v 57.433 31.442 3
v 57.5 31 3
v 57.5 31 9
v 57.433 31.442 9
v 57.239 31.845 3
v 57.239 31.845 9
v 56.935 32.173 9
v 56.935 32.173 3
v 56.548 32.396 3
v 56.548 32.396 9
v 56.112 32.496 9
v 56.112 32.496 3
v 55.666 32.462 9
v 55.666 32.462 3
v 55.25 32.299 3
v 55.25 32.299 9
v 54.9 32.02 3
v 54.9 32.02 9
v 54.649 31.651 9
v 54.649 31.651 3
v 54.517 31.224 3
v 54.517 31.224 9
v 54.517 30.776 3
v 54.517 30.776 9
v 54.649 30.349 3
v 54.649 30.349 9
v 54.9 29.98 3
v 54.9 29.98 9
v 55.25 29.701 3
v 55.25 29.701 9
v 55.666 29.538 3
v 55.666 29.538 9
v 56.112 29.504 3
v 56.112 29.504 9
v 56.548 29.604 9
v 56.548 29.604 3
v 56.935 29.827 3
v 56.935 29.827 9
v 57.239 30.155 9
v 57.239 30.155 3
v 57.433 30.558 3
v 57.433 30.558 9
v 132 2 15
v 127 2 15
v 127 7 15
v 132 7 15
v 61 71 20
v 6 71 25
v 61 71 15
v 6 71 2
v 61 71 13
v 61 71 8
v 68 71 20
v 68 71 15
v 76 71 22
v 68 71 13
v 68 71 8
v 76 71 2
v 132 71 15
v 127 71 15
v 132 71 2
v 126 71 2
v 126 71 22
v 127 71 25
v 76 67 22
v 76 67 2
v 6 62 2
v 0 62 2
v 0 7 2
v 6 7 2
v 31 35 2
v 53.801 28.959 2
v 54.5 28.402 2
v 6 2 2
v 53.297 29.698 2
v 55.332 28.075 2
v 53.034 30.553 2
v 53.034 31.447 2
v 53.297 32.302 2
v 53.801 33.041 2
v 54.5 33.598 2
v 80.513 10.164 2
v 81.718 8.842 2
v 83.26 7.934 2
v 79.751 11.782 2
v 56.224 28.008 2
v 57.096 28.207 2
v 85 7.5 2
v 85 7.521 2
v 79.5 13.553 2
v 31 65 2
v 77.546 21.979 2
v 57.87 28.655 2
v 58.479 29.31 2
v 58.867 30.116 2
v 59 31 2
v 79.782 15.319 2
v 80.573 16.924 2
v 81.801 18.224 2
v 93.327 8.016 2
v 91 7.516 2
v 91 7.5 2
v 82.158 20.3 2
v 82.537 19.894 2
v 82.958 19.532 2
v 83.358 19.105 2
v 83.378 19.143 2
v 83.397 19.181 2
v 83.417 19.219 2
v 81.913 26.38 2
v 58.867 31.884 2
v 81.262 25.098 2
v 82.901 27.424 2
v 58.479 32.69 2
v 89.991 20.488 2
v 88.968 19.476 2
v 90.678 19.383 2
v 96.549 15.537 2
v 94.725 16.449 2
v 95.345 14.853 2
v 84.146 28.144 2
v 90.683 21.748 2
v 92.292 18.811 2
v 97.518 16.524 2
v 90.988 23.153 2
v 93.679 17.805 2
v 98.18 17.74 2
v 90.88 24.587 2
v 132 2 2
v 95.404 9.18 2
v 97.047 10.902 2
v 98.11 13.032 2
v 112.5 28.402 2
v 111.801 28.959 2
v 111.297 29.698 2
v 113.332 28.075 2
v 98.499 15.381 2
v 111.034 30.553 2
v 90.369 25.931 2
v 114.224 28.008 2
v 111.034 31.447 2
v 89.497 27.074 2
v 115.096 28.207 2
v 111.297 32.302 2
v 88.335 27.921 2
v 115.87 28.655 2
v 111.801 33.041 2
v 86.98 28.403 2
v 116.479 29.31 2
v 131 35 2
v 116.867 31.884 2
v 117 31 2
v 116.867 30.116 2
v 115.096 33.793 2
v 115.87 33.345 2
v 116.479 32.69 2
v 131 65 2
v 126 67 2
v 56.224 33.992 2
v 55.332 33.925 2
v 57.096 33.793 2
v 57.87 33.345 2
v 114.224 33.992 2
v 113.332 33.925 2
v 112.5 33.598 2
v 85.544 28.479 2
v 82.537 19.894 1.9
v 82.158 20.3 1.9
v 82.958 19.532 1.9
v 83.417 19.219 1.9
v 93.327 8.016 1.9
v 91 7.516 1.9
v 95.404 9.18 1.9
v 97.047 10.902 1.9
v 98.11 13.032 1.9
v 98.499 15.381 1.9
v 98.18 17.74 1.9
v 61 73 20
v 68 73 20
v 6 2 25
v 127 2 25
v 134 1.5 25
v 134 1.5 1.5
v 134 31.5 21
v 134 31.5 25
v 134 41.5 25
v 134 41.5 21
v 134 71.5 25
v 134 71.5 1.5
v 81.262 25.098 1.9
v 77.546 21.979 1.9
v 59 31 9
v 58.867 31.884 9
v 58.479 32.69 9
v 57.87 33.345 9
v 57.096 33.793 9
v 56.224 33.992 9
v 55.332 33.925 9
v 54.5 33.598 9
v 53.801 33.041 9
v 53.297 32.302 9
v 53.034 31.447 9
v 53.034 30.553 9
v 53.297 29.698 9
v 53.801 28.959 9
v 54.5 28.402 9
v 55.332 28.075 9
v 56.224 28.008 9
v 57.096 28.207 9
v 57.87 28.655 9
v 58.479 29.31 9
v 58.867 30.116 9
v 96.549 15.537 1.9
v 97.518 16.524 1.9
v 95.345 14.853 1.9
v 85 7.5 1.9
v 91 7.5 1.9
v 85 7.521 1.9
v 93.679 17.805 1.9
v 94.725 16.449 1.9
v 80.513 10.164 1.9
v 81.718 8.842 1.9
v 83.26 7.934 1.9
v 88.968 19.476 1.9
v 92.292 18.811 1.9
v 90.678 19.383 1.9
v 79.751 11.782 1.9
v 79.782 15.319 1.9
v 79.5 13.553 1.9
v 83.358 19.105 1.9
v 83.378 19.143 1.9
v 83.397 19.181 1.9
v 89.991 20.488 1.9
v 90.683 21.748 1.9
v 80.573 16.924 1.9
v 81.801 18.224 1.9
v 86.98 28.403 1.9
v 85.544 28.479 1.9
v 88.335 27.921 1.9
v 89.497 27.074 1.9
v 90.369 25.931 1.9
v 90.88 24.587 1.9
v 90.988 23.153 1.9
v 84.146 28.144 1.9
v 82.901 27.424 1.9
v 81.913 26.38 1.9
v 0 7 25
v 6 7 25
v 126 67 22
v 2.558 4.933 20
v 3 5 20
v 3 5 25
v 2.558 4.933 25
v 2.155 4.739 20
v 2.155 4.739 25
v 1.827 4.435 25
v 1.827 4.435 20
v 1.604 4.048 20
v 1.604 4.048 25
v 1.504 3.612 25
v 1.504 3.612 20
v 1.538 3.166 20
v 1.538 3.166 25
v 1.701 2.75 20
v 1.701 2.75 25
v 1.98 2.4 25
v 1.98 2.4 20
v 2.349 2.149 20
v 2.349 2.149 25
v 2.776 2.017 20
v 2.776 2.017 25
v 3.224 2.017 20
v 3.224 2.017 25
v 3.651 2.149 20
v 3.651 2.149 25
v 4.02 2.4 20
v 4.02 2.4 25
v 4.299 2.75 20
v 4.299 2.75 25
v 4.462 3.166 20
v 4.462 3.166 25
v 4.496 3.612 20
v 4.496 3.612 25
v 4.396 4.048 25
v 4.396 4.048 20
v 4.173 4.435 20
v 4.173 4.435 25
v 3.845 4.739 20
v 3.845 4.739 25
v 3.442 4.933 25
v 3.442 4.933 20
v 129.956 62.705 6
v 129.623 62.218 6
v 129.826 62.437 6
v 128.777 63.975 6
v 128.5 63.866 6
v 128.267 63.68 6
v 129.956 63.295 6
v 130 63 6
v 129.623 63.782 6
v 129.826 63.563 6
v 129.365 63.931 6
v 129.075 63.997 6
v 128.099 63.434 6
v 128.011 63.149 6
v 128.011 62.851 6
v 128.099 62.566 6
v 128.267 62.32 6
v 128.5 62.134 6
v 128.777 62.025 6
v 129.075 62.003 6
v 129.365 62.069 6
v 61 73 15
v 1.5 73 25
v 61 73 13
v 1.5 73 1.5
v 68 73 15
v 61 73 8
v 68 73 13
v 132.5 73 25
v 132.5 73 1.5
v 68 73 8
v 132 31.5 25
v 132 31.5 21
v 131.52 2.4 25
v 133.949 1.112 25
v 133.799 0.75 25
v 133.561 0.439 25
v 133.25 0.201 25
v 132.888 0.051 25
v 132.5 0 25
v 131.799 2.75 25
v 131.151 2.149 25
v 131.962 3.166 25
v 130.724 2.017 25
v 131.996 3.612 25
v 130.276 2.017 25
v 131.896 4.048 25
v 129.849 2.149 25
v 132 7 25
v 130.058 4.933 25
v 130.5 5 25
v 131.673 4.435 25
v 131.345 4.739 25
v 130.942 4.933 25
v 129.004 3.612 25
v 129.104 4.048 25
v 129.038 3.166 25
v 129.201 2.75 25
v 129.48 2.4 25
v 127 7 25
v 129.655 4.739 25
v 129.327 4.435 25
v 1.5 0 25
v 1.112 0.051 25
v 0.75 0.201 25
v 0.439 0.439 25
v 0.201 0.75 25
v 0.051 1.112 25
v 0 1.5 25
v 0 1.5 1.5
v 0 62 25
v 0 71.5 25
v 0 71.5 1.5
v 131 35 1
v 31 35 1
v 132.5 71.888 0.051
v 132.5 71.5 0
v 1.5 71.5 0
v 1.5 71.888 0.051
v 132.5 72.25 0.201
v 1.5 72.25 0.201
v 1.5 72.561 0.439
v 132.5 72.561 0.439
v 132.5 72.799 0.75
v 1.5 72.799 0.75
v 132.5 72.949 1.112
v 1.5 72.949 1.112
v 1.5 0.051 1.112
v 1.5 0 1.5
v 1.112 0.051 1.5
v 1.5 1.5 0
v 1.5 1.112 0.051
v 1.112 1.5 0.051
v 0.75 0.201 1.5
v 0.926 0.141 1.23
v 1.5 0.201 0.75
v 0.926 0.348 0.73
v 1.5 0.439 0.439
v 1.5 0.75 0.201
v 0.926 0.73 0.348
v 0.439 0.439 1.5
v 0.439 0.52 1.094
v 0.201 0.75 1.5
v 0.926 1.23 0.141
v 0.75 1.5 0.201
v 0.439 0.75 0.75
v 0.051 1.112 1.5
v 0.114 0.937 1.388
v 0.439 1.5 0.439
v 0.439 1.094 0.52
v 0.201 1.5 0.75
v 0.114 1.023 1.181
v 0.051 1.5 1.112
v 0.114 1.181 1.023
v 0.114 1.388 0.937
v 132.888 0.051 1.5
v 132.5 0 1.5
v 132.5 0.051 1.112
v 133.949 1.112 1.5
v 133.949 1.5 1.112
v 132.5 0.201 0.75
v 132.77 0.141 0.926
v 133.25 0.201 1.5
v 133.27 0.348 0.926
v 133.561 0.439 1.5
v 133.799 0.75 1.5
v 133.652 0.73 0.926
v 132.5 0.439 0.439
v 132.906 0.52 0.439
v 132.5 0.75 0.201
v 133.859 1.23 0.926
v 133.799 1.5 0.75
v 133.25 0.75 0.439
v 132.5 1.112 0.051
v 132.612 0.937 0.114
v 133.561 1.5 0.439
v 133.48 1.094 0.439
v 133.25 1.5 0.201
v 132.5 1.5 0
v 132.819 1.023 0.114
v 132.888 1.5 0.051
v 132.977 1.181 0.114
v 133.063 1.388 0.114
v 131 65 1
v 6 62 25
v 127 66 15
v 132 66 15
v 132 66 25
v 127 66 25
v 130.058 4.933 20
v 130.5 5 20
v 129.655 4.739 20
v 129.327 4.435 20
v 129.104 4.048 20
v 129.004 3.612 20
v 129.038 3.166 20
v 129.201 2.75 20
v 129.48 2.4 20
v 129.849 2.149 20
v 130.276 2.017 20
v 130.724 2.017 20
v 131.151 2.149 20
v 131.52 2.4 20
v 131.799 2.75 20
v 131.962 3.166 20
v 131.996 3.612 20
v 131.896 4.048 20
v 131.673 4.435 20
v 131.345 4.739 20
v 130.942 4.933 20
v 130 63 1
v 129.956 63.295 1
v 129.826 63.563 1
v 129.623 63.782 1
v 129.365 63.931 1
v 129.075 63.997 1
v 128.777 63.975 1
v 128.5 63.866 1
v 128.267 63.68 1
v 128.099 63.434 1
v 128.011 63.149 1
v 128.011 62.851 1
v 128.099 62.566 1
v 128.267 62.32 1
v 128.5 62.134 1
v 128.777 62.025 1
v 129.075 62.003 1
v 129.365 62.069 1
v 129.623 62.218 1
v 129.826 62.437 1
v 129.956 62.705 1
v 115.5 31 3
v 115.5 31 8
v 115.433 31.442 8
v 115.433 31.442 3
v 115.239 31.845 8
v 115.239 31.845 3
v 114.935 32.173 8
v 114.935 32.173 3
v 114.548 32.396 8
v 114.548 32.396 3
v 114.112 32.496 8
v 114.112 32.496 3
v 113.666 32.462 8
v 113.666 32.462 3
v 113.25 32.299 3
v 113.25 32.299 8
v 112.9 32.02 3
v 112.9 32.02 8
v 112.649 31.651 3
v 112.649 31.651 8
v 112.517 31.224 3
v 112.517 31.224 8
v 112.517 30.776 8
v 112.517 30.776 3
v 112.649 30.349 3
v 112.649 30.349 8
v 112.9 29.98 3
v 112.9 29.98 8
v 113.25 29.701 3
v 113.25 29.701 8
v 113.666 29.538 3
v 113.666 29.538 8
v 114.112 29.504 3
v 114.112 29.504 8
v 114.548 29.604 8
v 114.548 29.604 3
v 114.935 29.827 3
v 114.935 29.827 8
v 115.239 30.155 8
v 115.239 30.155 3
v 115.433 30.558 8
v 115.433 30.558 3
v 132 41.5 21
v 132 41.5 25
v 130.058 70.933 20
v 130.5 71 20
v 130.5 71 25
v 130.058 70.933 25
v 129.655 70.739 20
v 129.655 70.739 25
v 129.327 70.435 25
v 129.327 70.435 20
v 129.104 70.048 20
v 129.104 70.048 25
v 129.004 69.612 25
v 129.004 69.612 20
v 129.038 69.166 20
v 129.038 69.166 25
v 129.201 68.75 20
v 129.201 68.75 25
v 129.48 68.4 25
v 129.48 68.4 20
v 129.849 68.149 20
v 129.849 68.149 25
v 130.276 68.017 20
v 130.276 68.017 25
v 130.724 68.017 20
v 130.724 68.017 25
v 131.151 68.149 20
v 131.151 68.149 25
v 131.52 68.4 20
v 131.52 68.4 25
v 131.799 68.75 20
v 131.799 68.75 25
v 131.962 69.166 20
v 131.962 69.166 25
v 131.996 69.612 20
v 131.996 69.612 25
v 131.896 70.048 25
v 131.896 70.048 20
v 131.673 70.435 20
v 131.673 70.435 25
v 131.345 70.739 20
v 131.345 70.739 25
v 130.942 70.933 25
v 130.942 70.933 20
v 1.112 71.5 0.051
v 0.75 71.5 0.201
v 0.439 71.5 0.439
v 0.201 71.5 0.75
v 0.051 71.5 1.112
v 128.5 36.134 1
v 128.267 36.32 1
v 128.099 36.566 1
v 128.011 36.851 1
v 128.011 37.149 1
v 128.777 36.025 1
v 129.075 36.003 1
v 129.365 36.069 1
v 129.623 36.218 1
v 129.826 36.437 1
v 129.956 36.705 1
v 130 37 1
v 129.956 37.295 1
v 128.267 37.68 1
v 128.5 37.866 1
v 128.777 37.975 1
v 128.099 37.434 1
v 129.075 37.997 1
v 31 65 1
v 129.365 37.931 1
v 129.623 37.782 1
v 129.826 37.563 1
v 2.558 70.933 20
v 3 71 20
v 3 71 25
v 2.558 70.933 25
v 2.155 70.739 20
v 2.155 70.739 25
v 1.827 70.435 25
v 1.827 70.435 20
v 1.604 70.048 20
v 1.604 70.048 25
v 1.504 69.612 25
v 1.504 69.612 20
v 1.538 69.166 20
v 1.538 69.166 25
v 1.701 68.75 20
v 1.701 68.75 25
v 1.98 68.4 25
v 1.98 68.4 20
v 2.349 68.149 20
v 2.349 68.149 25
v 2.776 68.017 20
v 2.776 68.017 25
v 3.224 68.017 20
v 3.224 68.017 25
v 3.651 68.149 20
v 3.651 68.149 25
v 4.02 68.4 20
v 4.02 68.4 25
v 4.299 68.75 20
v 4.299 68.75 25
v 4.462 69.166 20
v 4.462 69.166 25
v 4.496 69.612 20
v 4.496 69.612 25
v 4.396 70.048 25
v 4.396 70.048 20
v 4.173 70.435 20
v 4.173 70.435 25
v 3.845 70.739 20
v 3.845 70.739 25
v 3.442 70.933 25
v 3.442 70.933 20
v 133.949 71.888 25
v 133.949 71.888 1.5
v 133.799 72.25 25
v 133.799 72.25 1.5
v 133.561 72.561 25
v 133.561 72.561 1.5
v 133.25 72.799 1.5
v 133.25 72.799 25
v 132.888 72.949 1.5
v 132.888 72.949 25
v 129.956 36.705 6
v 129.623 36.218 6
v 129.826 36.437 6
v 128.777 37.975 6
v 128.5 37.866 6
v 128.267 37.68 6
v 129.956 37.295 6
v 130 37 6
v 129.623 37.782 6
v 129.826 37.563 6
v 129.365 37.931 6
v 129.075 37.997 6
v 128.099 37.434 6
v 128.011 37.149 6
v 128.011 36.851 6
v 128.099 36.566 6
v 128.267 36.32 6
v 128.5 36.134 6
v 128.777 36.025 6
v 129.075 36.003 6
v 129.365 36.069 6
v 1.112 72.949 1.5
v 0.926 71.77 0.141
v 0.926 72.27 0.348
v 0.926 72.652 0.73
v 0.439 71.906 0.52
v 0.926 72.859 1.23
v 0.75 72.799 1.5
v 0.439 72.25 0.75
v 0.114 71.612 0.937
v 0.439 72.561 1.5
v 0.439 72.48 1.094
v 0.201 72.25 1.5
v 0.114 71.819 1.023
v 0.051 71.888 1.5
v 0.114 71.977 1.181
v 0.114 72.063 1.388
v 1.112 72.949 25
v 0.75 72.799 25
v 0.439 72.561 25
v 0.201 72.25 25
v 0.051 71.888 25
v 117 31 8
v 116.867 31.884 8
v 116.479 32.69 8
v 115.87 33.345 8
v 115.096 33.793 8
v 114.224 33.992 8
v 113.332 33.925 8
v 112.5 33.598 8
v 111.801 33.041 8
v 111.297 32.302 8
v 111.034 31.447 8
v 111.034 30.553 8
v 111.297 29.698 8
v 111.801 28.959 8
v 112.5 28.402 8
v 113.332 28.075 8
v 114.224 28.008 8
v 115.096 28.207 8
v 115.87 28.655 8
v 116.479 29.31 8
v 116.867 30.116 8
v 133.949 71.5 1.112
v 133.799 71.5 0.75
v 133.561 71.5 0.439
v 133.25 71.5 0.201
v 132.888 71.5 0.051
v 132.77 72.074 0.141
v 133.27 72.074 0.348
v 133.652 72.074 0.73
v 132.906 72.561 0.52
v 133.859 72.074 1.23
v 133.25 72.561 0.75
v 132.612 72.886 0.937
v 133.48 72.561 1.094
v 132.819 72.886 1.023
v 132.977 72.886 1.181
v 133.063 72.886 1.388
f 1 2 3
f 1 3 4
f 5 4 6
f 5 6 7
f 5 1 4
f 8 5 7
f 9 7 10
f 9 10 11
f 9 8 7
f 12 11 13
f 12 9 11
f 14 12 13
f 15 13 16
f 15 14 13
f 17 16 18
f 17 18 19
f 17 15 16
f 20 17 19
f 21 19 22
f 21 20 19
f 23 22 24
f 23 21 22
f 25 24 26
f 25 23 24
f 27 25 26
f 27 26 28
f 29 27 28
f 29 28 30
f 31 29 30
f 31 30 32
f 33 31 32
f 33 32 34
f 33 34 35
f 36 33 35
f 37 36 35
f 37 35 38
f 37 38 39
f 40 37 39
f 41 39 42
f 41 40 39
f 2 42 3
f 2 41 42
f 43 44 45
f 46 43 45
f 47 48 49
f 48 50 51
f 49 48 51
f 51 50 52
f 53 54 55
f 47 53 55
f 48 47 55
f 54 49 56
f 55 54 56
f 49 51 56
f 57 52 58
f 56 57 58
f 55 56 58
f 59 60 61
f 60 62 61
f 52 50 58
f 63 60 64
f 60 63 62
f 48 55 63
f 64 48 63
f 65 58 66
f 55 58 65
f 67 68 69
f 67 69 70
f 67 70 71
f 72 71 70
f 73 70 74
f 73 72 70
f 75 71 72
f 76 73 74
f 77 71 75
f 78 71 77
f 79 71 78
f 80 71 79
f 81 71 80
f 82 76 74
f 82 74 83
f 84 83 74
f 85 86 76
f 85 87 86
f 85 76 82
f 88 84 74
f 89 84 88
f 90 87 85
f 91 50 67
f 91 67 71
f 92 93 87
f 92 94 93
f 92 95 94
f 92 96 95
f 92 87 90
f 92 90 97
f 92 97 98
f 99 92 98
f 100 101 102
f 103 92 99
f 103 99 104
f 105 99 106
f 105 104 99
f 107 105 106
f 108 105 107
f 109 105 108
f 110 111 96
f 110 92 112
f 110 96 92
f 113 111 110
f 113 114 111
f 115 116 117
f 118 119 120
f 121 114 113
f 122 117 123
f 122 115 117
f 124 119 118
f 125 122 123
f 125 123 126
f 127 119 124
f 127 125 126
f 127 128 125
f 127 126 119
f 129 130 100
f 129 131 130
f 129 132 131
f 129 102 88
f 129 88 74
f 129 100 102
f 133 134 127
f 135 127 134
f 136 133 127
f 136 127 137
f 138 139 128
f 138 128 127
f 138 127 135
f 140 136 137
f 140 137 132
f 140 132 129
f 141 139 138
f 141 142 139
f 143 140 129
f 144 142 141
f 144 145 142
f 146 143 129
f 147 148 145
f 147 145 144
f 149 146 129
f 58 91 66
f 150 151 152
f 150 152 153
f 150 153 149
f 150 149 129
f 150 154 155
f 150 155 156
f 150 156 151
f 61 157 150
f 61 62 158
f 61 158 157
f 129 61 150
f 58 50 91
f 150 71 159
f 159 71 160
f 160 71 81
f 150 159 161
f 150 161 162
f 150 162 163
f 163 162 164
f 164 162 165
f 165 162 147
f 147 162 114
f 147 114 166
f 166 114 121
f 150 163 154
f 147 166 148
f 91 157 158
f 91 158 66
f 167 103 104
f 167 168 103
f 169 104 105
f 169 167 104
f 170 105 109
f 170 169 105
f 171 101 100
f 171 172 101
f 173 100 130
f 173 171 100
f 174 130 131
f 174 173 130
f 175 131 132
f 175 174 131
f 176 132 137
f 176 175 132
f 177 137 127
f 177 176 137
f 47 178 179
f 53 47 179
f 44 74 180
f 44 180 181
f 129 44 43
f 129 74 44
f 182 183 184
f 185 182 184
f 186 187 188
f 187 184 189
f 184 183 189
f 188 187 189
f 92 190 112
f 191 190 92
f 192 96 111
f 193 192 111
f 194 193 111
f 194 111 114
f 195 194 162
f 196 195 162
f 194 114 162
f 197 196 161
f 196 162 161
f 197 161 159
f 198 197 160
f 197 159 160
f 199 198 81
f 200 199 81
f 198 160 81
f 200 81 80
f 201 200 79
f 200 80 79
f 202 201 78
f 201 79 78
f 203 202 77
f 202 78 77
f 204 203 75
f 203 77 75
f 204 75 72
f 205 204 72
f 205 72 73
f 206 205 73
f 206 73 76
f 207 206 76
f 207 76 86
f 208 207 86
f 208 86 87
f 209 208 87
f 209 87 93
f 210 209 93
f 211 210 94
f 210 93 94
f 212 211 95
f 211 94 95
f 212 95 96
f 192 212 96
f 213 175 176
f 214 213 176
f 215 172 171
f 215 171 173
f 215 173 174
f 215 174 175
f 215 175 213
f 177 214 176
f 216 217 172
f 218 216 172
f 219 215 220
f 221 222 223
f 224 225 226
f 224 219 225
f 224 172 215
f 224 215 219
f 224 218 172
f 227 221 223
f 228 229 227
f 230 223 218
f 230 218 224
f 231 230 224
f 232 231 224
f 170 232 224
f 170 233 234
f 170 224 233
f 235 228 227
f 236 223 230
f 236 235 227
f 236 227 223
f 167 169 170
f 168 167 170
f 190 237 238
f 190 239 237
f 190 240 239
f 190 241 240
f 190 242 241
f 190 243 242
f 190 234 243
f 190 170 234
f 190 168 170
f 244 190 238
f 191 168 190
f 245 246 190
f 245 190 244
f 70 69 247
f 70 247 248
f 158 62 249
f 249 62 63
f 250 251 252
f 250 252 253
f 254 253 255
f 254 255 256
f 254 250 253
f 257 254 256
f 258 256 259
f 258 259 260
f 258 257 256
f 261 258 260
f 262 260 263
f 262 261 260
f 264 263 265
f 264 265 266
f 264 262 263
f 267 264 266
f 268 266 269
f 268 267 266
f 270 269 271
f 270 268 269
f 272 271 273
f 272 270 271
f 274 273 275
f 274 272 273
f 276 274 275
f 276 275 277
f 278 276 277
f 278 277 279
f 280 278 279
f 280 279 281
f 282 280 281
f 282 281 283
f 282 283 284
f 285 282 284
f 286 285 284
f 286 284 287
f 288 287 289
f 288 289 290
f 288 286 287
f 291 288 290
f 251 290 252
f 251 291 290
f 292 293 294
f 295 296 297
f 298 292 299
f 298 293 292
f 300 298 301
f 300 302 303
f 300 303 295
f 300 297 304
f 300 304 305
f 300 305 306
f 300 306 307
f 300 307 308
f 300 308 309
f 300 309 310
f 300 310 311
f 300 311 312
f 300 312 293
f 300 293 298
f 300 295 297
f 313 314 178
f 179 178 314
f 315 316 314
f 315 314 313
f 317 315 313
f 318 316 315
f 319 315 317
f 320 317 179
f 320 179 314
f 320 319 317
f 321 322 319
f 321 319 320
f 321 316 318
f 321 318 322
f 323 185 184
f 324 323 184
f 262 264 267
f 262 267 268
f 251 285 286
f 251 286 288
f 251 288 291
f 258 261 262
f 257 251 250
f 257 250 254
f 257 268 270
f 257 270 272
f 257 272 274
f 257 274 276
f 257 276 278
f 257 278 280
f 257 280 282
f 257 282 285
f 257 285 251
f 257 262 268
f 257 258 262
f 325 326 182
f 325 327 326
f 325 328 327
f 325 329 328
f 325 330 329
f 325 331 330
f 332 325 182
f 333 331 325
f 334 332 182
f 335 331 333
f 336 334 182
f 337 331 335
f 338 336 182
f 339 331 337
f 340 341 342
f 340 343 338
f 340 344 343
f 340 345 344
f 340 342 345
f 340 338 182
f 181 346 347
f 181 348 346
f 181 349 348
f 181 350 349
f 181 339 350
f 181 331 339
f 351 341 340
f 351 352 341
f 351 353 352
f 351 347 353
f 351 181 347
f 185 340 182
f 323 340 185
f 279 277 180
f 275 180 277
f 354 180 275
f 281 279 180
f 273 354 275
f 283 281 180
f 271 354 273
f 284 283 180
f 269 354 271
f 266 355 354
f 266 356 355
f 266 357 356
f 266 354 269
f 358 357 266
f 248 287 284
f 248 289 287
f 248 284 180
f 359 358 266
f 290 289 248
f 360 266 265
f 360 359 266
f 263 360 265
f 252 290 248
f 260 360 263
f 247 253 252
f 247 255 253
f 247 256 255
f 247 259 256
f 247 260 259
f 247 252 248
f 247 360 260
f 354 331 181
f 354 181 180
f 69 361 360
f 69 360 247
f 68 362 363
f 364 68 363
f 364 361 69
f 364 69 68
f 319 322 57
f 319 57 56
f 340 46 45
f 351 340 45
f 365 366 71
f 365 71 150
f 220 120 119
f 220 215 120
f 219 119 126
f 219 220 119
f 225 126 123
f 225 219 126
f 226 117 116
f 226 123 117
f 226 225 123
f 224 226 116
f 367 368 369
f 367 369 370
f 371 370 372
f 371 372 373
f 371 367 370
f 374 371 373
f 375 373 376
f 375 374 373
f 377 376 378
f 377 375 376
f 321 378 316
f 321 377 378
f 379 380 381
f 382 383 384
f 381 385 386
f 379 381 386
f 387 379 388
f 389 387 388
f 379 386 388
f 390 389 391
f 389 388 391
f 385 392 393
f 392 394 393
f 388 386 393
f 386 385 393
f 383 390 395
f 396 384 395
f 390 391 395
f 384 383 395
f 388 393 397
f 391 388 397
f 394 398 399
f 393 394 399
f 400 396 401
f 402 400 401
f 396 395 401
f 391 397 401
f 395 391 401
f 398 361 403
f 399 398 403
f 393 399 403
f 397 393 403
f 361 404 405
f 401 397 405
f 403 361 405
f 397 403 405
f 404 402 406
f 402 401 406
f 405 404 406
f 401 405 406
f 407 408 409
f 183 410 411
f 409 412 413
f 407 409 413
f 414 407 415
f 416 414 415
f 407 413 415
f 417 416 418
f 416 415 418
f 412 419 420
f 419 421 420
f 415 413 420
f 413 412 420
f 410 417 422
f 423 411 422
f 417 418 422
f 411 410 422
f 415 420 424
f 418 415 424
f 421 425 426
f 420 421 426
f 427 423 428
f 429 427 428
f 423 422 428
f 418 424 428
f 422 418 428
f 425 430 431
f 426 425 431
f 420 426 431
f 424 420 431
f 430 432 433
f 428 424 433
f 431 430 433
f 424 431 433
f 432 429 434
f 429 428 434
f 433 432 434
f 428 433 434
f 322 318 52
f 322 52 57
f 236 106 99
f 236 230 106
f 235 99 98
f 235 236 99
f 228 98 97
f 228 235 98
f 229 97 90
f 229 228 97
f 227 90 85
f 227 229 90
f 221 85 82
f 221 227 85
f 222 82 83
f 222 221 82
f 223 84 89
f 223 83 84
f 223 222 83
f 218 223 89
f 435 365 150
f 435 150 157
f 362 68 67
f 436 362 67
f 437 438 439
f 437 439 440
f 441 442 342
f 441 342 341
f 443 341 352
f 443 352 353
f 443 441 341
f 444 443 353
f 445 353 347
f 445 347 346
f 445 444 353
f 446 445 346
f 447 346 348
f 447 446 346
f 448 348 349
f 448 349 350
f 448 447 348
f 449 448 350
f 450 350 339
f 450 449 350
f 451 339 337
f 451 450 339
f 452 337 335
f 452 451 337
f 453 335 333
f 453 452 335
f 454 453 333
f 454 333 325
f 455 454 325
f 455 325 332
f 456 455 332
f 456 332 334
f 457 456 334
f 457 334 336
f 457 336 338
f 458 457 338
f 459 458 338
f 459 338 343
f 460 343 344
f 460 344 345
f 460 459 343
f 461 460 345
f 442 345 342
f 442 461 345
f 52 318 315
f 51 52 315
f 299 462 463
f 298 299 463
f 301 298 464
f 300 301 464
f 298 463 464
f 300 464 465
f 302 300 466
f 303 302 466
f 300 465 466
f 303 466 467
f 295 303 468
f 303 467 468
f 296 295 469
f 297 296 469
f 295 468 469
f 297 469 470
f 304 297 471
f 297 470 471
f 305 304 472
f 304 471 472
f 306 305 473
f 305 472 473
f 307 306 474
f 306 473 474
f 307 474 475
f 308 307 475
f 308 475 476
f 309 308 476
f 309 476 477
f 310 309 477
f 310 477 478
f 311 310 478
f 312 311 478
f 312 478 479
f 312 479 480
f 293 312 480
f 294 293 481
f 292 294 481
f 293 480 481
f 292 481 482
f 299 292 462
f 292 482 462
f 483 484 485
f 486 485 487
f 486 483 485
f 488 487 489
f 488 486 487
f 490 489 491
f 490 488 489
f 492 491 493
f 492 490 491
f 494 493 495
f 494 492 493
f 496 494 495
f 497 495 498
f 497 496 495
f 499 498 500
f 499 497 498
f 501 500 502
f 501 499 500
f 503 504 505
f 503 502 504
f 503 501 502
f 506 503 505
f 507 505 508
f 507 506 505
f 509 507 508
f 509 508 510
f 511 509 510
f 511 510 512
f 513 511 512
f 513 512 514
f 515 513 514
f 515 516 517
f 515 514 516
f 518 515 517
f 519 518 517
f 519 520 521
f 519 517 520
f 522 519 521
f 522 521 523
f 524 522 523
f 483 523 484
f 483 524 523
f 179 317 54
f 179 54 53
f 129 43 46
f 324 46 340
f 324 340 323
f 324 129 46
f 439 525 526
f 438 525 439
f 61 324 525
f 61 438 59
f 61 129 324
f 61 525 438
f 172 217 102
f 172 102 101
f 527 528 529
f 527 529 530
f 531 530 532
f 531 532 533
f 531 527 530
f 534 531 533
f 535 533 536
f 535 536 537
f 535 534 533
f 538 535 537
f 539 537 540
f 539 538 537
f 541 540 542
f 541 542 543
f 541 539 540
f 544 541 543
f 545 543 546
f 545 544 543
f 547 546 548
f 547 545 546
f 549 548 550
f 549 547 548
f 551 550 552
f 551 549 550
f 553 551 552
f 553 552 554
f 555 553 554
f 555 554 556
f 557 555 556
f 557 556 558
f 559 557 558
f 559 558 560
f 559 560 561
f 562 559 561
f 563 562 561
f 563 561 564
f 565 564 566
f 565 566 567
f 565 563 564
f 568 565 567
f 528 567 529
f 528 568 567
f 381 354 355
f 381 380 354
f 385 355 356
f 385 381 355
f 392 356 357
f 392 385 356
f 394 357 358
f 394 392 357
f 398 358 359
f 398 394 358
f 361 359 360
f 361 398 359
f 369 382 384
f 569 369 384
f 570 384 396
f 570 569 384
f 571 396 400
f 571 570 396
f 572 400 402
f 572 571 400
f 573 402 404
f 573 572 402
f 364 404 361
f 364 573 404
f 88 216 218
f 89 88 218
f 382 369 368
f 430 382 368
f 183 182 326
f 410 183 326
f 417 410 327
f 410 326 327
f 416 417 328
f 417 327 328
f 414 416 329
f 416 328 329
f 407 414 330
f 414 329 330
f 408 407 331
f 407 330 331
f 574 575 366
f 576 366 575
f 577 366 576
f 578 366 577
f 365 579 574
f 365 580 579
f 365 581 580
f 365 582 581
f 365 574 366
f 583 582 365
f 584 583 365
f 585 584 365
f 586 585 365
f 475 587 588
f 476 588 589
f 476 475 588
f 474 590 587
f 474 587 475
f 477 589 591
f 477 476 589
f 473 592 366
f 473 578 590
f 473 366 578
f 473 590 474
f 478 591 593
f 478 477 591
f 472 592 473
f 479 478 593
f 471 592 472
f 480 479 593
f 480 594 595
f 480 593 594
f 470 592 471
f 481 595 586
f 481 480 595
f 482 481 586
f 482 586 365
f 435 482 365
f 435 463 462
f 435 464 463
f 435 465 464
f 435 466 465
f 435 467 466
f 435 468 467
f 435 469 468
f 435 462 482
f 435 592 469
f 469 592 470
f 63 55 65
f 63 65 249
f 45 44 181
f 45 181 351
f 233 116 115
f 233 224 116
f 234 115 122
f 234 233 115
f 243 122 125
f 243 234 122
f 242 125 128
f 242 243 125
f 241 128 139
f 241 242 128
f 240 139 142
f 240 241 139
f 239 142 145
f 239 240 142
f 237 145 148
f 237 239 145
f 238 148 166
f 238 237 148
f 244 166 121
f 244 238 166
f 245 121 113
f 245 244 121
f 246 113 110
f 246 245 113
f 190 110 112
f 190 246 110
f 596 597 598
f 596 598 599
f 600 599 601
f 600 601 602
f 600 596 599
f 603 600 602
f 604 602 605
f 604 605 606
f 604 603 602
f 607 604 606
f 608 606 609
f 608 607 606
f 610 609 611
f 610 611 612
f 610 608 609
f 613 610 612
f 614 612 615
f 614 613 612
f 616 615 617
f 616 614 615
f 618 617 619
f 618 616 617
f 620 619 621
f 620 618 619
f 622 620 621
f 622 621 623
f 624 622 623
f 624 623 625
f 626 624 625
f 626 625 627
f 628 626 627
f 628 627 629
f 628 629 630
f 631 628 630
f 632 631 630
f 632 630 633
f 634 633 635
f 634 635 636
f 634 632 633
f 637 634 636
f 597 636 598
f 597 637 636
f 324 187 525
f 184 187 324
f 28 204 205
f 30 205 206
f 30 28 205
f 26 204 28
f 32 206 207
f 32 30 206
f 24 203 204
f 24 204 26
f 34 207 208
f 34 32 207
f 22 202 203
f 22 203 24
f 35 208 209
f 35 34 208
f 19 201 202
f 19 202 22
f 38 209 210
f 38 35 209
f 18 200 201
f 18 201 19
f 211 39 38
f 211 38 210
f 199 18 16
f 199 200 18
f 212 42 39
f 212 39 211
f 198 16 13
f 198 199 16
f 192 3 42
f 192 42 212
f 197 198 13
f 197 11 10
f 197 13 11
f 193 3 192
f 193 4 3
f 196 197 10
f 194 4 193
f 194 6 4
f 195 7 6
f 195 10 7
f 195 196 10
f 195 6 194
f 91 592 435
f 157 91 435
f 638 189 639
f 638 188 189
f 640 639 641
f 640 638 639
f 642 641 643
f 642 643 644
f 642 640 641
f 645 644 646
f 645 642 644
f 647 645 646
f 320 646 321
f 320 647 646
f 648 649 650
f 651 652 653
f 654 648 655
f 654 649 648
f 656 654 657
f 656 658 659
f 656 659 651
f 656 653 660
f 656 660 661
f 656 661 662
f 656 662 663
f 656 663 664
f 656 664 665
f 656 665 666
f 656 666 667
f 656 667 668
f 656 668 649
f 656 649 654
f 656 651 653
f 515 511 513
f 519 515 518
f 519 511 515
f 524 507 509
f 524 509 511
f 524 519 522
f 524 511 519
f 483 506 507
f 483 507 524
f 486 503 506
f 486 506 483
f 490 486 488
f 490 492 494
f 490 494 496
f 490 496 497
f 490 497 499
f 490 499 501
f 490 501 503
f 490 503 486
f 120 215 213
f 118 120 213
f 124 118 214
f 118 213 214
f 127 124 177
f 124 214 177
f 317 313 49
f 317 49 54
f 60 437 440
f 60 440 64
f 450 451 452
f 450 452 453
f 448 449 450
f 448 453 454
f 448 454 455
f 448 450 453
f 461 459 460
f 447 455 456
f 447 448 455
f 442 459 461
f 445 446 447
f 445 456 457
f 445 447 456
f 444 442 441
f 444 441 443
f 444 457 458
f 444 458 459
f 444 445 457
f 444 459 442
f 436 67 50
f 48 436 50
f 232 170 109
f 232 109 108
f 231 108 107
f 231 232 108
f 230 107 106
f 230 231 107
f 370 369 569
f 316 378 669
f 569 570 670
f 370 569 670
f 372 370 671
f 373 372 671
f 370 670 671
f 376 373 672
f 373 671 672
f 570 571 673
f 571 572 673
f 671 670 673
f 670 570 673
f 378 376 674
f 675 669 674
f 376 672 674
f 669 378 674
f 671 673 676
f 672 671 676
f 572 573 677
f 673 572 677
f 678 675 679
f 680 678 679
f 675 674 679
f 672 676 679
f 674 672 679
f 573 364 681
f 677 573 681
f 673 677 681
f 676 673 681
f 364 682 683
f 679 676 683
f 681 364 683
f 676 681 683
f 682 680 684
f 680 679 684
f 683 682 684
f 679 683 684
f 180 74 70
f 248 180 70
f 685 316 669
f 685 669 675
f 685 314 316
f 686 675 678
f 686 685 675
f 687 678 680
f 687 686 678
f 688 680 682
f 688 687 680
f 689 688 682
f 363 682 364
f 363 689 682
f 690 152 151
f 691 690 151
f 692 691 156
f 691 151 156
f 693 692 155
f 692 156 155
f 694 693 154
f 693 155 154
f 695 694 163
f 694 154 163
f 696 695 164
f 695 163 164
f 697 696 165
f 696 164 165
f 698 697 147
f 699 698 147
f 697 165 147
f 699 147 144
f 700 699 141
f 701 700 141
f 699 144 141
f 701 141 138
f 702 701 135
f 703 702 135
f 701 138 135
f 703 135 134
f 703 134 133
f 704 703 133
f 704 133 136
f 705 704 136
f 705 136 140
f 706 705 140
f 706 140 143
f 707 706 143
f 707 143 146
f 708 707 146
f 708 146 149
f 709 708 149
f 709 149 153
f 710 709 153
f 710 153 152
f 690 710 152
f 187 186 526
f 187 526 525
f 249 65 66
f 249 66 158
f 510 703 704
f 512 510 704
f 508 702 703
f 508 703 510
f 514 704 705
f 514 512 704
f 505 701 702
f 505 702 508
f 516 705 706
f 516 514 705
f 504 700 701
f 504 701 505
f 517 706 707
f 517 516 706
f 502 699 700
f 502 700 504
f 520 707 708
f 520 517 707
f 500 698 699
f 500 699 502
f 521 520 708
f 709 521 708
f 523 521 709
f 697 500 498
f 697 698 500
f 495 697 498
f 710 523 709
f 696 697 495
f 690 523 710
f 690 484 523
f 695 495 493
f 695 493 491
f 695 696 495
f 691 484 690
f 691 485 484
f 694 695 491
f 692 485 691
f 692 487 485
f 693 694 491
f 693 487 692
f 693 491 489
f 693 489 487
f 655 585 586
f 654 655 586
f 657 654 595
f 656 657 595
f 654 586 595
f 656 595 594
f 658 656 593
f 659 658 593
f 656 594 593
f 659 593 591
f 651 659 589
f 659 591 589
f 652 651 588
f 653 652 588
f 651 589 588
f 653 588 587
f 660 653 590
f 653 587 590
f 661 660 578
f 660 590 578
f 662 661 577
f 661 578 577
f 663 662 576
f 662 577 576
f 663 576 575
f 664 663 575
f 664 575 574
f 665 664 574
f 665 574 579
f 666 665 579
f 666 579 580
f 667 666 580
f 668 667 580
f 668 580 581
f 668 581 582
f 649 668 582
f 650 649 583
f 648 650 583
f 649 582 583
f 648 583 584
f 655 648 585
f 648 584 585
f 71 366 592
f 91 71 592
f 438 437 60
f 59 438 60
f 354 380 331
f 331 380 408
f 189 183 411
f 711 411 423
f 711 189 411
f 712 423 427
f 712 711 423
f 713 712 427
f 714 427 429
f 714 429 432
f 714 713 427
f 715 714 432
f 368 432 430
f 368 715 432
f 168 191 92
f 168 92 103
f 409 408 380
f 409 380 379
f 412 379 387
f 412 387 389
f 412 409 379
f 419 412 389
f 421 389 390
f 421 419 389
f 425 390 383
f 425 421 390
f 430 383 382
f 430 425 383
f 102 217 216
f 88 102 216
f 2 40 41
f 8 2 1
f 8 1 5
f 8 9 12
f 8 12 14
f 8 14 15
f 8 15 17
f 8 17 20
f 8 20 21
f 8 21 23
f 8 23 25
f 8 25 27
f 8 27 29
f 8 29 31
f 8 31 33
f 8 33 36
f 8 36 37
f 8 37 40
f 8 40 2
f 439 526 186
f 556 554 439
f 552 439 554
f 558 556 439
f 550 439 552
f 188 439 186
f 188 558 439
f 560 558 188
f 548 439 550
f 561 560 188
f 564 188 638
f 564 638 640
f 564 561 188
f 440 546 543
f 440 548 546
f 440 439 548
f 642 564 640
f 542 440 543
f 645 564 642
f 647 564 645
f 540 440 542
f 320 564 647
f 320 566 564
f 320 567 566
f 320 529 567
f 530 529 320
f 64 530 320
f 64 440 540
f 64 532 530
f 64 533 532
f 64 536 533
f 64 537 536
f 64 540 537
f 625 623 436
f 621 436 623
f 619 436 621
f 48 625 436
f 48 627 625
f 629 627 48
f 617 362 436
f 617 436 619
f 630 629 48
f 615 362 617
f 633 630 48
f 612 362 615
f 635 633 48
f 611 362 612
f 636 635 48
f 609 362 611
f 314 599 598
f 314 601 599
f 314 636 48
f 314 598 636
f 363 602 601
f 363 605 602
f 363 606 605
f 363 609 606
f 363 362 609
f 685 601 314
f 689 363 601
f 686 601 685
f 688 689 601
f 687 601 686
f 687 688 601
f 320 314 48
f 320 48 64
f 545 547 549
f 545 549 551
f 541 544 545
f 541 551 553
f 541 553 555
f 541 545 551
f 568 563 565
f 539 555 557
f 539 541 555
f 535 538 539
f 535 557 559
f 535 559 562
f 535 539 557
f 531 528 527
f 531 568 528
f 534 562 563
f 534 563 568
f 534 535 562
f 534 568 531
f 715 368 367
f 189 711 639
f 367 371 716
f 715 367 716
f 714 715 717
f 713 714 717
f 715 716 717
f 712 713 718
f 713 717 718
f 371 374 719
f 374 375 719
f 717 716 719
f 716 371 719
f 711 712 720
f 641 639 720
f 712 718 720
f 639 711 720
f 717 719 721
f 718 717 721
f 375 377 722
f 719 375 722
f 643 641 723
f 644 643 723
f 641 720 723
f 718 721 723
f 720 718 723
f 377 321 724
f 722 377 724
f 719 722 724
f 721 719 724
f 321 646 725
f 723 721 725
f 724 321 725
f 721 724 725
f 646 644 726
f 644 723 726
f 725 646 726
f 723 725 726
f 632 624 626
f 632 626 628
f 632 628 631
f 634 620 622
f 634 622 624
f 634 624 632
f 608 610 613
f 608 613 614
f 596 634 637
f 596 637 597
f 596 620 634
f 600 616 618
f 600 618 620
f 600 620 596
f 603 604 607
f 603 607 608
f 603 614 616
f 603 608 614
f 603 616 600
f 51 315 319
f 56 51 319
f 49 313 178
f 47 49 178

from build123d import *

# Parameters (mm, degrees)
BOX_W             = 134
BOX_H             = 73
BOX_DEPTH         = 25
BOX001_W          = 126
BOX001_H          = 69
BOX001_DEPTH      = 23
BOX002_W          = 10
BOX002_H          = 55
BOX002_DEPTH      = 23
BOX003_W          = 100
BOX003_H          = 30
BOX003_DEPTH      = 1
CYLINDER_R        = 1
CYLINDER_DEPTH    = 5
CYLINDER001_R     = 1
CYLINDER001_DEPTH = 5
CYLINDER002_R     = 3
CYLINDER002_DEPTH = 7
CYLINDER003_R     = 1.5
CYLINDER003_DEPTH = 6
CYLINDER004_R     = 3
CYLINDER004_DEPTH = 7
CYLINDER005_R     = 1.5
CYLINDER005_DEPTH = 6
BOX004_W          = 7
BOX004_H          = 5
BOX004_DEPTH      = 7
BOX005_W          = 7
BOX005_H          = 5
BOX005_DEPTH      = 5
BOX006_W          = 50
BOX006_H          = 20
BOX006_DEPTH      = 4
BOX007_W          = 4
BOX007_H          = 10
BOX007_DEPTH      = 2
CYLINDER006_R     = 1.5
CYLINDER006_DEPTH = 5
CYLINDER007_R     = 1.5
CYLINDER007_DEPTH = 5
BOX008_W          = 5
BOX008_H          = 5
BOX008_DEPTH      = 10
BOX009_W          = 5
BOX009_H          = 5
BOX009_DEPTH      = 10
CYLINDER008_R     = 1.5
CYLINDER008_DEPTH = 5
CYLINDER009_R     = 1.5
CYLINDER009_DEPTH = 5
FILLET_R          = 1.5
FILLET001_R       = 1.5
FILLET002_R       = 1.5
FILLET003_R       = 1.5
CYLINDER010_R     = 6
CYLINDER010_DEPTH = 0.1
CYLINDER011_R     = 6
CYLINDER011_DEPTH = 0.1
BOX010_W          = 12
BOX010_H          = 6
BOX010_DEPTH      = 0.1
CYLINDER012_R     = 5
CYLINDER012_DEPTH = 0.1
CYLINDER013_R     = 8
CYLINDER013_DEPTH = 0.1
CYLINDER014_R     = 5
CYLINDER014_DEPTH = 0.1
CYLINDER015_R     = 6
CYLINDER015_DEPTH = 0.1
CYLINDER016_R     = 5
CYLINDER016_DEPTH = 0.1
PRISM_DEPTH       = 0.1


with BuildPart() as part:
    # Box → Box (join)
    with BuildSketch(Plane.XY):
        with Locations((67, 36.5)):
            Rectangle(BOX_W, BOX_H)
    extrude(amount=BOX_DEPTH)

    # Box001 → Box001 (cut)
    with BuildSketch(Plane(origin=(6, 2, 2), x_dir=(1, 0, 0), z_dir=(0, 0, 1))):
        with Locations((63, 34.5)):
            Rectangle(BOX001_W, BOX001_H)
    extrude(amount=BOX001_DEPTH, mode=Mode.SUBTRACT)

    # Box002 → Box002 (cut)
    with BuildSketch(Plane(origin=(-2, 7, 2), x_dir=(1, 0, 0), z_dir=(0, 0, 1))):
        with Locations((5, 27.5)):
            Rectangle(BOX002_W, BOX002_H)
    extrude(amount=BOX002_DEPTH, mode=Mode.SUBTRACT)

    # Box003 → Box003 (cut)
    with BuildSketch(Plane(origin=(31, 35, 1), x_dir=(1, 0, 0), z_dir=(0, 0, 1))):
        with Locations((50, 15)):
            Rectangle(BOX003_W, BOX003_H)
    extrude(amount=BOX003_DEPTH, mode=Mode.SUBTRACT)

    # Cylinder → Cylinder (join)
    with BuildSketch(Plane(origin=(129, 37, 1), x_dir=(1, 0, 0), z_dir=(0, 0, 1))):
        Circle(CYLINDER_R)
    extrude(amount=CYLINDER_DEPTH)

    # Cylinder001 → Cylinder001 (join)
    with BuildSketch(Plane(origin=(129, 63, 1), x_dir=(1, 0, 0), z_dir=(0, 0, 1))):
        Circle(CYLINDER001_R)
    extrude(amount=CYLINDER001_DEPTH)

    # Cylinder002 → Cylinder002 (join)
    with BuildSketch(Plane(origin=(114, 31, 1), x_dir=(1, 0, 0), z_dir=(0, 0, 1))):
        Circle(CYLINDER002_R)
    extrude(amount=CYLINDER002_DEPTH)

    # Cylinder003 → Cylinder003 (cut)
    with BuildSketch(Plane(origin=(114, 31, 3), x_dir=(1, 0, 0), z_dir=(0, 0, 1))):
        Circle(CYLINDER003_R)
    extrude(amount=CYLINDER003_DEPTH, mode=Mode.SUBTRACT)

    # Cylinder004 → Cylinder004 (join)
    with BuildSketch(Plane(origin=(56, 31, 2), x_dir=(1, 0, 0), z_dir=(0, 0, 1))):
        Circle(CYLINDER004_R)
    extrude(amount=CYLINDER004_DEPTH)

    # Cylinder005 → Cylinder005 (cut)
    with BuildSketch(Plane(origin=(56, 31, 3), x_dir=(1, 0, 0), z_dir=(0, 0, 1))):
        Circle(CYLINDER005_R)
    extrude(amount=CYLINDER005_DEPTH, mode=Mode.SUBTRACT)

    # Box004 → Box004 (cut)
    with BuildSketch(Plane(origin=(61, 74, 8), x_dir=(1, 0, 0), z_dir=(0, -1, 0))):
        with Locations((3.5, 2.5)):
            Rectangle(BOX004_W, BOX004_H)
    extrude(amount=BOX004_DEPTH, mode=Mode.SUBTRACT)

    # Box005 → Box005 (cut)
    with BuildSketch(Plane(origin=(61, 74, 15), x_dir=(1, 0, 0), z_dir=(0, -1, 0))):
        with Locations((3.5, 2.5)):
            Rectangle(BOX005_W, BOX005_H)
    extrude(amount=BOX005_DEPTH, mode=Mode.SUBTRACT)

    # Box006 → Box006 (join)
    with BuildSketch(Plane(origin=(76, 71, 2), x_dir=(1, 0, 0), z_dir=(0, -1, 0))):
        with Locations((25, 10)):
            Rectangle(BOX006_W, BOX006_H)
    extrude(amount=BOX006_DEPTH)

    # Box007 → Box007 (cut)
    with BuildSketch(Plane(origin=(134, 41.5, 25), x_dir=(0, 0, -1), z_dir=(-1, 0, 0))):
        with Locations((2, 5)):
            Rectangle(BOX007_W, BOX007_H)
    extrude(amount=BOX007_DEPTH, mode=Mode.SUBTRACT)

    # Cylinder006 → Cylinder006 (cut)
    with BuildSketch(Plane(origin=(3, 3.5, 20), x_dir=(0, 1, 0), z_dir=(0, 0, 1))):
        Circle(CYLINDER006_R)
    extrude(amount=CYLINDER006_DEPTH, mode=Mode.SUBTRACT)

    # Cylinder007 → Cylinder007 (cut)
    with BuildSketch(Plane(origin=(3, 69.5, 20), x_dir=(0, 1, 0), z_dir=(0, 0, 1))):
        Circle(CYLINDER007_R)
    extrude(amount=CYLINDER007_DEPTH, mode=Mode.SUBTRACT)

    # Box008 → Box008 (join)
    with BuildSketch(Plane(origin=(132, 2, 15), x_dir=(0, 1, 0), z_dir=(0, 0, 1))):
        with Locations((2.5, 2.5)):
            Rectangle(BOX008_W, BOX008_H)
    extrude(amount=BOX008_DEPTH)

    # Box009 → Box009 (join)
    with BuildSketch(Plane(origin=(132, 66, 15), x_dir=(0, 1, 0), z_dir=(0, 0, 1))):
        with Locations((2.5, 2.5)):
            Rectangle(BOX009_W, BOX009_H)
    extrude(amount=BOX009_DEPTH)

    # Cylinder008 → Cylinder008 (cut)
    with BuildSketch(Plane(origin=(130.5, 69.5, 20), x_dir=(0, 1, 0), z_dir=(0, 0, 1))):
        Circle(CYLINDER008_R)
    extrude(amount=CYLINDER008_DEPTH, mode=Mode.SUBTRACT)

    # Cylinder009 → Cylinder009 (cut)
    with BuildSketch(Plane(origin=(130.5, 3.5, 20), x_dir=(0, 1, 0), z_dir=(0, 0, 1))):
        Circle(CYLINDER009_R)
    extrude(amount=CYLINDER009_DEPTH, mode=Mode.SUBTRACT)

    # Fillet
    fillet_edges = [part.edges().sort_by_distance(p)[0] for p in [
        (134, 0, 12.5),
    ]]
    fillet(fillet_edges, radius=FILLET_R)

    # Fillet001
    fillet001_edges = [part.edges().sort_by_distance(p)[0] for p in [
        (66.25, 0, 0),
    ]]
    fillet(fillet001_edges, radius=FILLET001_R)

    # Fillet002
    fillet002_edges = [part.edges().sort_by_distance(p)[0] for p in [
        (134, 73, 13.25),
    ]]
    fillet(fillet002_edges, radius=FILLET002_R)

    # Fillet003
    fillet003_edges = [part.edges().sort_by_distance(p)[0] for p in [
        (0, 36.5, 0),
    ]]
    fillet(fillet003_edges, radius=FILLET003_R)

    # Cylinder010 → Cylinder010 (cut)
    with BuildSketch(Plane(origin=(90.5, 13.5, 1.9), x_dir=(0, 1, 0), z_dir=(0, 0, 1))):
        Circle(CYLINDER010_R)
    extrude(amount=CYLINDER010_DEPTH, mode=Mode.SUBTRACT)

    # Cylinder011 → Cylinder011 (cut)
    with BuildSketch(Plane(origin=(85.5, 13.5, 1.9), x_dir=(0, 1, 0), z_dir=(0, 0, 1))):
        Circle(CYLINDER011_R)
    extrude(amount=CYLINDER011_DEPTH, mode=Mode.SUBTRACT)

    # Box010 → Box010 (cut)
    with BuildSketch(Plane(origin=(91, 7.5, 1.9), x_dir=(0, 1, 0), z_dir=(0, 0, 1))):
        with Locations((6, 3)):
            Rectangle(BOX010_W, BOX010_H)
    extrude(amount=BOX010_DEPTH, mode=Mode.SUBTRACT)

    # Cylinder012 → Cylinder012 (cut)
    with BuildSketch(Plane(origin=(86, 23.5, 1.9), x_dir=(0, 1, 0), z_dir=(0, 0, 1))):
        Circle(CYLINDER012_R)
    extrude(amount=CYLINDER012_DEPTH, mode=Mode.SUBTRACT)

    # Cylinder013 → Cylinder013 (cut)
    with BuildSketch(Plane(origin=(90.5, 15.5, 1.9), x_dir=(0, 1, 0), z_dir=(0, 0, 1))):
        Circle(CYLINDER013_R)
    extrude(amount=CYLINDER013_DEPTH, mode=Mode.SUBTRACT)

    # Cylinder014 → Cylinder014 (join)
    with BuildSketch(Plane(origin=(93.5, 19.5, 1.9), x_dir=(0, 1, 0), z_dir=(0, 0, 1))):
        Circle(CYLINDER014_R)
    extrude(amount=CYLINDER014_DEPTH)

    # Cylinder015 → Cylinder015 (cut)
    with BuildSketch(Plane(origin=(89.5, 13.5, 1.9), x_dir=(0, 1, 0), z_dir=(0, 0, 1))):
        Circle(CYLINDER015_R)
    extrude(amount=CYLINDER015_DEPTH, mode=Mode.SUBTRACT)

    # Cylinder016 → Cylinder016 (cut)
    with BuildSketch(Plane(origin=(86, 23.5, 1.9), x_dir=(0, 1, 0), z_dir=(0, 0, 1))):
        Circle(CYLINDER016_R)
    extrude(amount=CYLINDER016_DEPTH, mode=Mode.SUBTRACT)

    # Prism → Prism (cut)
    with BuildSketch(Plane(origin=(80.5, 22.5, 1.9), x_dir=(0.34202, 0.939693, 0), z_dir=(0, 0, 1))):
        Polygon((3, 0), (-1.5, 2.598076), (-1.5, -2.598076), align=None)
    extrude(amount=PRISM_DEPTH, mode=Mode.SUBTRACT)


solid = part.part
